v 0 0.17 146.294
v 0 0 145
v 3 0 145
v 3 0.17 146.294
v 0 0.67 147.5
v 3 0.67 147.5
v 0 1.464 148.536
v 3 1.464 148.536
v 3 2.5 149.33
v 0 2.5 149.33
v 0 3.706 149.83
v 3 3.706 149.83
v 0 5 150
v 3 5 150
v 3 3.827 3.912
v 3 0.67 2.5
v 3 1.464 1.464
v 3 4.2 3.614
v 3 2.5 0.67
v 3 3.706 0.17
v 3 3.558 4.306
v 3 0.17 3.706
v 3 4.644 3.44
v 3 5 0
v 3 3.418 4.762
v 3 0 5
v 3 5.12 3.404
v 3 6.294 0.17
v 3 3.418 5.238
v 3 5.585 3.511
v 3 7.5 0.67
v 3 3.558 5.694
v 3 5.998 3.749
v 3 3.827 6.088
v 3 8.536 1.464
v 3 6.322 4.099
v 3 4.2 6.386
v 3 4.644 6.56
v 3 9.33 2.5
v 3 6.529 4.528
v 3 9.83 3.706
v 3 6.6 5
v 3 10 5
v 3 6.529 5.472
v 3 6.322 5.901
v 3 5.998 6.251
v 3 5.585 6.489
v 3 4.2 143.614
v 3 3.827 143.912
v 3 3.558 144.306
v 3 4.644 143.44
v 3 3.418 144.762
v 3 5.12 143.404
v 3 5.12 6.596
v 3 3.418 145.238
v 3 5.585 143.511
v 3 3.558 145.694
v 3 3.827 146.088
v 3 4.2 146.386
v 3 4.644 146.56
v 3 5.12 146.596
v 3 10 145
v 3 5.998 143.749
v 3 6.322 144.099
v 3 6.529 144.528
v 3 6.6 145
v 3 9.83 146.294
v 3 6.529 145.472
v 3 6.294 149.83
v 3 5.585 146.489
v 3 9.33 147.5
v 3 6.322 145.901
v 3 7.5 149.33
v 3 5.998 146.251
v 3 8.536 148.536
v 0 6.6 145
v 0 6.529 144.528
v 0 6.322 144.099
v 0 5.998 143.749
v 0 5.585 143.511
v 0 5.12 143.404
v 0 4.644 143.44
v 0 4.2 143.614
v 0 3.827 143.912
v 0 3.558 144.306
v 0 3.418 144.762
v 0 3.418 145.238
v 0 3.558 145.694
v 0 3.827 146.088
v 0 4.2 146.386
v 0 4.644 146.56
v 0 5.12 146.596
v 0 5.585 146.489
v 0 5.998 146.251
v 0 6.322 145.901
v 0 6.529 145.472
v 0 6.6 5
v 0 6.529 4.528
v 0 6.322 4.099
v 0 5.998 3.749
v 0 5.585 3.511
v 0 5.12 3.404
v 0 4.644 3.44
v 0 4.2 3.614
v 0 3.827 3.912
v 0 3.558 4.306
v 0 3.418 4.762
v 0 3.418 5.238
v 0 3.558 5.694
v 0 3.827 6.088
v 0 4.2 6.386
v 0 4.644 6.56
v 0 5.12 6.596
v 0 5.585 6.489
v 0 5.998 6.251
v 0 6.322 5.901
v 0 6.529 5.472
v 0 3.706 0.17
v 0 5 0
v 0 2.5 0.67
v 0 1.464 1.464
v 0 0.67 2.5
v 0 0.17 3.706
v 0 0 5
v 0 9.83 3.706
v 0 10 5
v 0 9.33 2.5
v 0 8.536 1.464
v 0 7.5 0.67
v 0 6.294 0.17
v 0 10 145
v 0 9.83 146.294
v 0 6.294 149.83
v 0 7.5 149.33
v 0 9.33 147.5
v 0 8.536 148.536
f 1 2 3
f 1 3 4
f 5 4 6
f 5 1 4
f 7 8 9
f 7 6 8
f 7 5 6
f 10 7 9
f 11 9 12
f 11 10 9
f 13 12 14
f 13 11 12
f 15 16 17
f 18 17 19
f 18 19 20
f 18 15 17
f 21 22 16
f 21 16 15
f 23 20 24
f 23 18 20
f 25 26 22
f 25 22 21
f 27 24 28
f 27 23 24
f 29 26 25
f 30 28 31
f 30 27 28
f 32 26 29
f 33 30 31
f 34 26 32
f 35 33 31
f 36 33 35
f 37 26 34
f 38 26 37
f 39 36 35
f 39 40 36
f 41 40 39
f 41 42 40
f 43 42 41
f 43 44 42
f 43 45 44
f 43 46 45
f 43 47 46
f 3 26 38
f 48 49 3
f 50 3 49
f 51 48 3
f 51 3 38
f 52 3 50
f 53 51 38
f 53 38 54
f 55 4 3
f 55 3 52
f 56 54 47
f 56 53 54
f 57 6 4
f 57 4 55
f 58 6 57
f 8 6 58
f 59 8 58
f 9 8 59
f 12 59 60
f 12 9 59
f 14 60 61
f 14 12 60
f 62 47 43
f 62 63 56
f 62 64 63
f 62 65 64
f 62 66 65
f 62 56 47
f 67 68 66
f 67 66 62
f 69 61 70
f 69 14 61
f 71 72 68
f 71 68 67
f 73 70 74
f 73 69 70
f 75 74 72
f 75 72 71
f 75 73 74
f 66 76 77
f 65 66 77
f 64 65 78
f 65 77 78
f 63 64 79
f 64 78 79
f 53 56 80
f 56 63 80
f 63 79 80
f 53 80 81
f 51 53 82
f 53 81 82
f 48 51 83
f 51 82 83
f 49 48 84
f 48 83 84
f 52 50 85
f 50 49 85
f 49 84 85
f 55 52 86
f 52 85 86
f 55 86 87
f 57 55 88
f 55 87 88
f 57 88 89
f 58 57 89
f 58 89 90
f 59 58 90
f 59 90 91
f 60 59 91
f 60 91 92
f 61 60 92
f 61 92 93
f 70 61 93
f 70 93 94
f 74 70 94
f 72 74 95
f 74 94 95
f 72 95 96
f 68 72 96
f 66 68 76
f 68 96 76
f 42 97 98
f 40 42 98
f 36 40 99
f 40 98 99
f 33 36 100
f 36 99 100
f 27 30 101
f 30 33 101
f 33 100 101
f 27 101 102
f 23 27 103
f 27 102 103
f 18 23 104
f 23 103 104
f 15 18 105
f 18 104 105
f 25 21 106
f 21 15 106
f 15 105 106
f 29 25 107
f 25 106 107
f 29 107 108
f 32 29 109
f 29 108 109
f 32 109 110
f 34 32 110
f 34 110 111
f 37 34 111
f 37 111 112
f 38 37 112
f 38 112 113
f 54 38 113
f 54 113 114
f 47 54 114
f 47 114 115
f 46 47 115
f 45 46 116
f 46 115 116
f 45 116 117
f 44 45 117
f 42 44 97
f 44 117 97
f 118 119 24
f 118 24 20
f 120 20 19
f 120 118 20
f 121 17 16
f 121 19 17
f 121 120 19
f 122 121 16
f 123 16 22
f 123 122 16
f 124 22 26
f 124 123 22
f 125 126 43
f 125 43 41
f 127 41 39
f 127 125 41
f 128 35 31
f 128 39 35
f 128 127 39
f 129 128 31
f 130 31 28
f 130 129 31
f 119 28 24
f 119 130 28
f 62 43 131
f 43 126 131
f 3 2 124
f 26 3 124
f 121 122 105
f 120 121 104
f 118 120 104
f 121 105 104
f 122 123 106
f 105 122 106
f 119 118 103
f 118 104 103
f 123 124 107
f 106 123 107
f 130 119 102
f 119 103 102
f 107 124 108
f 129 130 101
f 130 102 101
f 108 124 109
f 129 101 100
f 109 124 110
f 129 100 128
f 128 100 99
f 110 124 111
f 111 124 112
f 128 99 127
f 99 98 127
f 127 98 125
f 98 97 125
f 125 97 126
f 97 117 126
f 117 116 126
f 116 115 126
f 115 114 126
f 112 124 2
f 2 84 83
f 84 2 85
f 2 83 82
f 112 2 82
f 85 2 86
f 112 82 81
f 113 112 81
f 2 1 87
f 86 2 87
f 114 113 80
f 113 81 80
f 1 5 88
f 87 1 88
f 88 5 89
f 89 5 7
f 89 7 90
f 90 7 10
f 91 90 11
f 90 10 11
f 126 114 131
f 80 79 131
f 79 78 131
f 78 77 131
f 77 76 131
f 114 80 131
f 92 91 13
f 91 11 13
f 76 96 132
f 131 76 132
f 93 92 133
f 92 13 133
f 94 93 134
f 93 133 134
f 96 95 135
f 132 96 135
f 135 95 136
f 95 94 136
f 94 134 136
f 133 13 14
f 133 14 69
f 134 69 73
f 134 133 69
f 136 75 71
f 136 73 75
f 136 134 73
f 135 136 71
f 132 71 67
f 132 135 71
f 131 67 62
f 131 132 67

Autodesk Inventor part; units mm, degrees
ref_plane "YZ Plane" through (0, 0, 0) normal (1, 0, 0) x (0, 1, 0)
ref_plane "XZ Plane" through (0, 0, 0) normal (0, 1, 0) x (-1, 0, 0)
ref_plane "XY Plane" through (0, 0, 0) normal (0, 0, 1) x (1, 0, 0)
sketch "Szkic1" plane through (0, 0, 0) normal (1, 0, 0) x (0, 1, 0)
  line L0 (5, 0) -> (5, 0)
  line L1 (10, 5) -> (10, 145)
  line L2 (5, 150) -> (5, 150)
  line L3 (0, 145) -> (0, 5)
  arc A0 (10, 145) -> (5, 150) centre (5, 145) ccw
  arc A1 (5, 150) -> (0, 145) centre (5, 145) ccw
  arc A2 (5, 0) -> (10, 5) centre (5, 5) ccw
  arc A3 (0, 5) -> (5, 0) centre (5, 5) ccw
  circle A4 centre (5, 145) radius 1.6
  circle A5 centre (5, 5) radius 1.6
  point P0 (0, 0)
  point P1 (10, 150)
  point P2 (0, 150)
  dimension "d0" = 10
  dimension "d1" = 5
  dimension "d2" = 140
  dimension "d3" = 3.2
  dimension "d4" = 3.2
extrude "Wyciągnięcie proste1" add sketch "Szkic1" along normal blind 3
properties part number "korbowód"
